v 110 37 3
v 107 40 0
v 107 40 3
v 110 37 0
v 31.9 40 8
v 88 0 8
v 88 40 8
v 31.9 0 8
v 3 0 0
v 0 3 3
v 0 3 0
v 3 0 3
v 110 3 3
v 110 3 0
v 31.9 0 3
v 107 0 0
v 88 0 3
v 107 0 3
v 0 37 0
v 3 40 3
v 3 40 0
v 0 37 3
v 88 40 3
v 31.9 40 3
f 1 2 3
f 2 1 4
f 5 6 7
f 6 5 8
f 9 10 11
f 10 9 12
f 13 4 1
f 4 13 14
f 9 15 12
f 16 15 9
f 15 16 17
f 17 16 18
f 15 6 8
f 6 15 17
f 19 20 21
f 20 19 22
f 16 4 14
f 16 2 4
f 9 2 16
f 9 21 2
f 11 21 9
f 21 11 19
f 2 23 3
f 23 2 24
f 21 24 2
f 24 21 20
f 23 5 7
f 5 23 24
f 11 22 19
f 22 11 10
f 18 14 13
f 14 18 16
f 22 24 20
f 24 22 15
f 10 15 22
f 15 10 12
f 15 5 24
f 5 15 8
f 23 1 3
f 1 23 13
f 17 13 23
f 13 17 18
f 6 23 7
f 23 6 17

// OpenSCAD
$fn = 32;

// ----------------------------------------------------------------------
// Stepped bar: centerstep, 110 x 40 x 8/3 mm
// ----------------------------------------------------------------------

// --- parameters (mm) ---
bar_l = 110;              // bar length, X
bar_w = 40;               // bar width, Y
plate_t = 8;              // thickness of the thick zone, Z
thin_t = 3;               // thickness of the thin zone
corner_c = 3;             // corner chamfer of the bar
step_cut = 5;             // material removed from the thin zone
thick_from = 31.9;        // start of the thick middle zone
thick_to = 88;            // end of the thick middle zone
depth_1 = 5;              // depth of cut 1 from the top face
depth_2 = 5;              // depth of cut 2 from the top face

profile = [[3, 0], [107, 0], [110, 3], [110, 37], [107, 40], [3, 40], [0, 37], [0, 3]];  // primary outline, 8 points, counter clockwise
void_1 = [[-1, -1], [31.9, -1], [31.9, 41], [-1, 41]];  // thin left end, 4 points
void_2 = [[88, -1], [111, -1], [111, 41], [88, 41]];  // thin right end, 4 points

// --- the one profile operation ---
difference() {
  linear_extrude(height = plate_t) polygon(points = profile);
  translate([0, 0, plate_t - depth_1])
    linear_extrude(height = depth_1 + 1) polygon(points = void_1);
  translate([0, 0, plate_t - depth_2])
    linear_extrude(height = depth_2 + 1) polygon(points = void_2);
}
